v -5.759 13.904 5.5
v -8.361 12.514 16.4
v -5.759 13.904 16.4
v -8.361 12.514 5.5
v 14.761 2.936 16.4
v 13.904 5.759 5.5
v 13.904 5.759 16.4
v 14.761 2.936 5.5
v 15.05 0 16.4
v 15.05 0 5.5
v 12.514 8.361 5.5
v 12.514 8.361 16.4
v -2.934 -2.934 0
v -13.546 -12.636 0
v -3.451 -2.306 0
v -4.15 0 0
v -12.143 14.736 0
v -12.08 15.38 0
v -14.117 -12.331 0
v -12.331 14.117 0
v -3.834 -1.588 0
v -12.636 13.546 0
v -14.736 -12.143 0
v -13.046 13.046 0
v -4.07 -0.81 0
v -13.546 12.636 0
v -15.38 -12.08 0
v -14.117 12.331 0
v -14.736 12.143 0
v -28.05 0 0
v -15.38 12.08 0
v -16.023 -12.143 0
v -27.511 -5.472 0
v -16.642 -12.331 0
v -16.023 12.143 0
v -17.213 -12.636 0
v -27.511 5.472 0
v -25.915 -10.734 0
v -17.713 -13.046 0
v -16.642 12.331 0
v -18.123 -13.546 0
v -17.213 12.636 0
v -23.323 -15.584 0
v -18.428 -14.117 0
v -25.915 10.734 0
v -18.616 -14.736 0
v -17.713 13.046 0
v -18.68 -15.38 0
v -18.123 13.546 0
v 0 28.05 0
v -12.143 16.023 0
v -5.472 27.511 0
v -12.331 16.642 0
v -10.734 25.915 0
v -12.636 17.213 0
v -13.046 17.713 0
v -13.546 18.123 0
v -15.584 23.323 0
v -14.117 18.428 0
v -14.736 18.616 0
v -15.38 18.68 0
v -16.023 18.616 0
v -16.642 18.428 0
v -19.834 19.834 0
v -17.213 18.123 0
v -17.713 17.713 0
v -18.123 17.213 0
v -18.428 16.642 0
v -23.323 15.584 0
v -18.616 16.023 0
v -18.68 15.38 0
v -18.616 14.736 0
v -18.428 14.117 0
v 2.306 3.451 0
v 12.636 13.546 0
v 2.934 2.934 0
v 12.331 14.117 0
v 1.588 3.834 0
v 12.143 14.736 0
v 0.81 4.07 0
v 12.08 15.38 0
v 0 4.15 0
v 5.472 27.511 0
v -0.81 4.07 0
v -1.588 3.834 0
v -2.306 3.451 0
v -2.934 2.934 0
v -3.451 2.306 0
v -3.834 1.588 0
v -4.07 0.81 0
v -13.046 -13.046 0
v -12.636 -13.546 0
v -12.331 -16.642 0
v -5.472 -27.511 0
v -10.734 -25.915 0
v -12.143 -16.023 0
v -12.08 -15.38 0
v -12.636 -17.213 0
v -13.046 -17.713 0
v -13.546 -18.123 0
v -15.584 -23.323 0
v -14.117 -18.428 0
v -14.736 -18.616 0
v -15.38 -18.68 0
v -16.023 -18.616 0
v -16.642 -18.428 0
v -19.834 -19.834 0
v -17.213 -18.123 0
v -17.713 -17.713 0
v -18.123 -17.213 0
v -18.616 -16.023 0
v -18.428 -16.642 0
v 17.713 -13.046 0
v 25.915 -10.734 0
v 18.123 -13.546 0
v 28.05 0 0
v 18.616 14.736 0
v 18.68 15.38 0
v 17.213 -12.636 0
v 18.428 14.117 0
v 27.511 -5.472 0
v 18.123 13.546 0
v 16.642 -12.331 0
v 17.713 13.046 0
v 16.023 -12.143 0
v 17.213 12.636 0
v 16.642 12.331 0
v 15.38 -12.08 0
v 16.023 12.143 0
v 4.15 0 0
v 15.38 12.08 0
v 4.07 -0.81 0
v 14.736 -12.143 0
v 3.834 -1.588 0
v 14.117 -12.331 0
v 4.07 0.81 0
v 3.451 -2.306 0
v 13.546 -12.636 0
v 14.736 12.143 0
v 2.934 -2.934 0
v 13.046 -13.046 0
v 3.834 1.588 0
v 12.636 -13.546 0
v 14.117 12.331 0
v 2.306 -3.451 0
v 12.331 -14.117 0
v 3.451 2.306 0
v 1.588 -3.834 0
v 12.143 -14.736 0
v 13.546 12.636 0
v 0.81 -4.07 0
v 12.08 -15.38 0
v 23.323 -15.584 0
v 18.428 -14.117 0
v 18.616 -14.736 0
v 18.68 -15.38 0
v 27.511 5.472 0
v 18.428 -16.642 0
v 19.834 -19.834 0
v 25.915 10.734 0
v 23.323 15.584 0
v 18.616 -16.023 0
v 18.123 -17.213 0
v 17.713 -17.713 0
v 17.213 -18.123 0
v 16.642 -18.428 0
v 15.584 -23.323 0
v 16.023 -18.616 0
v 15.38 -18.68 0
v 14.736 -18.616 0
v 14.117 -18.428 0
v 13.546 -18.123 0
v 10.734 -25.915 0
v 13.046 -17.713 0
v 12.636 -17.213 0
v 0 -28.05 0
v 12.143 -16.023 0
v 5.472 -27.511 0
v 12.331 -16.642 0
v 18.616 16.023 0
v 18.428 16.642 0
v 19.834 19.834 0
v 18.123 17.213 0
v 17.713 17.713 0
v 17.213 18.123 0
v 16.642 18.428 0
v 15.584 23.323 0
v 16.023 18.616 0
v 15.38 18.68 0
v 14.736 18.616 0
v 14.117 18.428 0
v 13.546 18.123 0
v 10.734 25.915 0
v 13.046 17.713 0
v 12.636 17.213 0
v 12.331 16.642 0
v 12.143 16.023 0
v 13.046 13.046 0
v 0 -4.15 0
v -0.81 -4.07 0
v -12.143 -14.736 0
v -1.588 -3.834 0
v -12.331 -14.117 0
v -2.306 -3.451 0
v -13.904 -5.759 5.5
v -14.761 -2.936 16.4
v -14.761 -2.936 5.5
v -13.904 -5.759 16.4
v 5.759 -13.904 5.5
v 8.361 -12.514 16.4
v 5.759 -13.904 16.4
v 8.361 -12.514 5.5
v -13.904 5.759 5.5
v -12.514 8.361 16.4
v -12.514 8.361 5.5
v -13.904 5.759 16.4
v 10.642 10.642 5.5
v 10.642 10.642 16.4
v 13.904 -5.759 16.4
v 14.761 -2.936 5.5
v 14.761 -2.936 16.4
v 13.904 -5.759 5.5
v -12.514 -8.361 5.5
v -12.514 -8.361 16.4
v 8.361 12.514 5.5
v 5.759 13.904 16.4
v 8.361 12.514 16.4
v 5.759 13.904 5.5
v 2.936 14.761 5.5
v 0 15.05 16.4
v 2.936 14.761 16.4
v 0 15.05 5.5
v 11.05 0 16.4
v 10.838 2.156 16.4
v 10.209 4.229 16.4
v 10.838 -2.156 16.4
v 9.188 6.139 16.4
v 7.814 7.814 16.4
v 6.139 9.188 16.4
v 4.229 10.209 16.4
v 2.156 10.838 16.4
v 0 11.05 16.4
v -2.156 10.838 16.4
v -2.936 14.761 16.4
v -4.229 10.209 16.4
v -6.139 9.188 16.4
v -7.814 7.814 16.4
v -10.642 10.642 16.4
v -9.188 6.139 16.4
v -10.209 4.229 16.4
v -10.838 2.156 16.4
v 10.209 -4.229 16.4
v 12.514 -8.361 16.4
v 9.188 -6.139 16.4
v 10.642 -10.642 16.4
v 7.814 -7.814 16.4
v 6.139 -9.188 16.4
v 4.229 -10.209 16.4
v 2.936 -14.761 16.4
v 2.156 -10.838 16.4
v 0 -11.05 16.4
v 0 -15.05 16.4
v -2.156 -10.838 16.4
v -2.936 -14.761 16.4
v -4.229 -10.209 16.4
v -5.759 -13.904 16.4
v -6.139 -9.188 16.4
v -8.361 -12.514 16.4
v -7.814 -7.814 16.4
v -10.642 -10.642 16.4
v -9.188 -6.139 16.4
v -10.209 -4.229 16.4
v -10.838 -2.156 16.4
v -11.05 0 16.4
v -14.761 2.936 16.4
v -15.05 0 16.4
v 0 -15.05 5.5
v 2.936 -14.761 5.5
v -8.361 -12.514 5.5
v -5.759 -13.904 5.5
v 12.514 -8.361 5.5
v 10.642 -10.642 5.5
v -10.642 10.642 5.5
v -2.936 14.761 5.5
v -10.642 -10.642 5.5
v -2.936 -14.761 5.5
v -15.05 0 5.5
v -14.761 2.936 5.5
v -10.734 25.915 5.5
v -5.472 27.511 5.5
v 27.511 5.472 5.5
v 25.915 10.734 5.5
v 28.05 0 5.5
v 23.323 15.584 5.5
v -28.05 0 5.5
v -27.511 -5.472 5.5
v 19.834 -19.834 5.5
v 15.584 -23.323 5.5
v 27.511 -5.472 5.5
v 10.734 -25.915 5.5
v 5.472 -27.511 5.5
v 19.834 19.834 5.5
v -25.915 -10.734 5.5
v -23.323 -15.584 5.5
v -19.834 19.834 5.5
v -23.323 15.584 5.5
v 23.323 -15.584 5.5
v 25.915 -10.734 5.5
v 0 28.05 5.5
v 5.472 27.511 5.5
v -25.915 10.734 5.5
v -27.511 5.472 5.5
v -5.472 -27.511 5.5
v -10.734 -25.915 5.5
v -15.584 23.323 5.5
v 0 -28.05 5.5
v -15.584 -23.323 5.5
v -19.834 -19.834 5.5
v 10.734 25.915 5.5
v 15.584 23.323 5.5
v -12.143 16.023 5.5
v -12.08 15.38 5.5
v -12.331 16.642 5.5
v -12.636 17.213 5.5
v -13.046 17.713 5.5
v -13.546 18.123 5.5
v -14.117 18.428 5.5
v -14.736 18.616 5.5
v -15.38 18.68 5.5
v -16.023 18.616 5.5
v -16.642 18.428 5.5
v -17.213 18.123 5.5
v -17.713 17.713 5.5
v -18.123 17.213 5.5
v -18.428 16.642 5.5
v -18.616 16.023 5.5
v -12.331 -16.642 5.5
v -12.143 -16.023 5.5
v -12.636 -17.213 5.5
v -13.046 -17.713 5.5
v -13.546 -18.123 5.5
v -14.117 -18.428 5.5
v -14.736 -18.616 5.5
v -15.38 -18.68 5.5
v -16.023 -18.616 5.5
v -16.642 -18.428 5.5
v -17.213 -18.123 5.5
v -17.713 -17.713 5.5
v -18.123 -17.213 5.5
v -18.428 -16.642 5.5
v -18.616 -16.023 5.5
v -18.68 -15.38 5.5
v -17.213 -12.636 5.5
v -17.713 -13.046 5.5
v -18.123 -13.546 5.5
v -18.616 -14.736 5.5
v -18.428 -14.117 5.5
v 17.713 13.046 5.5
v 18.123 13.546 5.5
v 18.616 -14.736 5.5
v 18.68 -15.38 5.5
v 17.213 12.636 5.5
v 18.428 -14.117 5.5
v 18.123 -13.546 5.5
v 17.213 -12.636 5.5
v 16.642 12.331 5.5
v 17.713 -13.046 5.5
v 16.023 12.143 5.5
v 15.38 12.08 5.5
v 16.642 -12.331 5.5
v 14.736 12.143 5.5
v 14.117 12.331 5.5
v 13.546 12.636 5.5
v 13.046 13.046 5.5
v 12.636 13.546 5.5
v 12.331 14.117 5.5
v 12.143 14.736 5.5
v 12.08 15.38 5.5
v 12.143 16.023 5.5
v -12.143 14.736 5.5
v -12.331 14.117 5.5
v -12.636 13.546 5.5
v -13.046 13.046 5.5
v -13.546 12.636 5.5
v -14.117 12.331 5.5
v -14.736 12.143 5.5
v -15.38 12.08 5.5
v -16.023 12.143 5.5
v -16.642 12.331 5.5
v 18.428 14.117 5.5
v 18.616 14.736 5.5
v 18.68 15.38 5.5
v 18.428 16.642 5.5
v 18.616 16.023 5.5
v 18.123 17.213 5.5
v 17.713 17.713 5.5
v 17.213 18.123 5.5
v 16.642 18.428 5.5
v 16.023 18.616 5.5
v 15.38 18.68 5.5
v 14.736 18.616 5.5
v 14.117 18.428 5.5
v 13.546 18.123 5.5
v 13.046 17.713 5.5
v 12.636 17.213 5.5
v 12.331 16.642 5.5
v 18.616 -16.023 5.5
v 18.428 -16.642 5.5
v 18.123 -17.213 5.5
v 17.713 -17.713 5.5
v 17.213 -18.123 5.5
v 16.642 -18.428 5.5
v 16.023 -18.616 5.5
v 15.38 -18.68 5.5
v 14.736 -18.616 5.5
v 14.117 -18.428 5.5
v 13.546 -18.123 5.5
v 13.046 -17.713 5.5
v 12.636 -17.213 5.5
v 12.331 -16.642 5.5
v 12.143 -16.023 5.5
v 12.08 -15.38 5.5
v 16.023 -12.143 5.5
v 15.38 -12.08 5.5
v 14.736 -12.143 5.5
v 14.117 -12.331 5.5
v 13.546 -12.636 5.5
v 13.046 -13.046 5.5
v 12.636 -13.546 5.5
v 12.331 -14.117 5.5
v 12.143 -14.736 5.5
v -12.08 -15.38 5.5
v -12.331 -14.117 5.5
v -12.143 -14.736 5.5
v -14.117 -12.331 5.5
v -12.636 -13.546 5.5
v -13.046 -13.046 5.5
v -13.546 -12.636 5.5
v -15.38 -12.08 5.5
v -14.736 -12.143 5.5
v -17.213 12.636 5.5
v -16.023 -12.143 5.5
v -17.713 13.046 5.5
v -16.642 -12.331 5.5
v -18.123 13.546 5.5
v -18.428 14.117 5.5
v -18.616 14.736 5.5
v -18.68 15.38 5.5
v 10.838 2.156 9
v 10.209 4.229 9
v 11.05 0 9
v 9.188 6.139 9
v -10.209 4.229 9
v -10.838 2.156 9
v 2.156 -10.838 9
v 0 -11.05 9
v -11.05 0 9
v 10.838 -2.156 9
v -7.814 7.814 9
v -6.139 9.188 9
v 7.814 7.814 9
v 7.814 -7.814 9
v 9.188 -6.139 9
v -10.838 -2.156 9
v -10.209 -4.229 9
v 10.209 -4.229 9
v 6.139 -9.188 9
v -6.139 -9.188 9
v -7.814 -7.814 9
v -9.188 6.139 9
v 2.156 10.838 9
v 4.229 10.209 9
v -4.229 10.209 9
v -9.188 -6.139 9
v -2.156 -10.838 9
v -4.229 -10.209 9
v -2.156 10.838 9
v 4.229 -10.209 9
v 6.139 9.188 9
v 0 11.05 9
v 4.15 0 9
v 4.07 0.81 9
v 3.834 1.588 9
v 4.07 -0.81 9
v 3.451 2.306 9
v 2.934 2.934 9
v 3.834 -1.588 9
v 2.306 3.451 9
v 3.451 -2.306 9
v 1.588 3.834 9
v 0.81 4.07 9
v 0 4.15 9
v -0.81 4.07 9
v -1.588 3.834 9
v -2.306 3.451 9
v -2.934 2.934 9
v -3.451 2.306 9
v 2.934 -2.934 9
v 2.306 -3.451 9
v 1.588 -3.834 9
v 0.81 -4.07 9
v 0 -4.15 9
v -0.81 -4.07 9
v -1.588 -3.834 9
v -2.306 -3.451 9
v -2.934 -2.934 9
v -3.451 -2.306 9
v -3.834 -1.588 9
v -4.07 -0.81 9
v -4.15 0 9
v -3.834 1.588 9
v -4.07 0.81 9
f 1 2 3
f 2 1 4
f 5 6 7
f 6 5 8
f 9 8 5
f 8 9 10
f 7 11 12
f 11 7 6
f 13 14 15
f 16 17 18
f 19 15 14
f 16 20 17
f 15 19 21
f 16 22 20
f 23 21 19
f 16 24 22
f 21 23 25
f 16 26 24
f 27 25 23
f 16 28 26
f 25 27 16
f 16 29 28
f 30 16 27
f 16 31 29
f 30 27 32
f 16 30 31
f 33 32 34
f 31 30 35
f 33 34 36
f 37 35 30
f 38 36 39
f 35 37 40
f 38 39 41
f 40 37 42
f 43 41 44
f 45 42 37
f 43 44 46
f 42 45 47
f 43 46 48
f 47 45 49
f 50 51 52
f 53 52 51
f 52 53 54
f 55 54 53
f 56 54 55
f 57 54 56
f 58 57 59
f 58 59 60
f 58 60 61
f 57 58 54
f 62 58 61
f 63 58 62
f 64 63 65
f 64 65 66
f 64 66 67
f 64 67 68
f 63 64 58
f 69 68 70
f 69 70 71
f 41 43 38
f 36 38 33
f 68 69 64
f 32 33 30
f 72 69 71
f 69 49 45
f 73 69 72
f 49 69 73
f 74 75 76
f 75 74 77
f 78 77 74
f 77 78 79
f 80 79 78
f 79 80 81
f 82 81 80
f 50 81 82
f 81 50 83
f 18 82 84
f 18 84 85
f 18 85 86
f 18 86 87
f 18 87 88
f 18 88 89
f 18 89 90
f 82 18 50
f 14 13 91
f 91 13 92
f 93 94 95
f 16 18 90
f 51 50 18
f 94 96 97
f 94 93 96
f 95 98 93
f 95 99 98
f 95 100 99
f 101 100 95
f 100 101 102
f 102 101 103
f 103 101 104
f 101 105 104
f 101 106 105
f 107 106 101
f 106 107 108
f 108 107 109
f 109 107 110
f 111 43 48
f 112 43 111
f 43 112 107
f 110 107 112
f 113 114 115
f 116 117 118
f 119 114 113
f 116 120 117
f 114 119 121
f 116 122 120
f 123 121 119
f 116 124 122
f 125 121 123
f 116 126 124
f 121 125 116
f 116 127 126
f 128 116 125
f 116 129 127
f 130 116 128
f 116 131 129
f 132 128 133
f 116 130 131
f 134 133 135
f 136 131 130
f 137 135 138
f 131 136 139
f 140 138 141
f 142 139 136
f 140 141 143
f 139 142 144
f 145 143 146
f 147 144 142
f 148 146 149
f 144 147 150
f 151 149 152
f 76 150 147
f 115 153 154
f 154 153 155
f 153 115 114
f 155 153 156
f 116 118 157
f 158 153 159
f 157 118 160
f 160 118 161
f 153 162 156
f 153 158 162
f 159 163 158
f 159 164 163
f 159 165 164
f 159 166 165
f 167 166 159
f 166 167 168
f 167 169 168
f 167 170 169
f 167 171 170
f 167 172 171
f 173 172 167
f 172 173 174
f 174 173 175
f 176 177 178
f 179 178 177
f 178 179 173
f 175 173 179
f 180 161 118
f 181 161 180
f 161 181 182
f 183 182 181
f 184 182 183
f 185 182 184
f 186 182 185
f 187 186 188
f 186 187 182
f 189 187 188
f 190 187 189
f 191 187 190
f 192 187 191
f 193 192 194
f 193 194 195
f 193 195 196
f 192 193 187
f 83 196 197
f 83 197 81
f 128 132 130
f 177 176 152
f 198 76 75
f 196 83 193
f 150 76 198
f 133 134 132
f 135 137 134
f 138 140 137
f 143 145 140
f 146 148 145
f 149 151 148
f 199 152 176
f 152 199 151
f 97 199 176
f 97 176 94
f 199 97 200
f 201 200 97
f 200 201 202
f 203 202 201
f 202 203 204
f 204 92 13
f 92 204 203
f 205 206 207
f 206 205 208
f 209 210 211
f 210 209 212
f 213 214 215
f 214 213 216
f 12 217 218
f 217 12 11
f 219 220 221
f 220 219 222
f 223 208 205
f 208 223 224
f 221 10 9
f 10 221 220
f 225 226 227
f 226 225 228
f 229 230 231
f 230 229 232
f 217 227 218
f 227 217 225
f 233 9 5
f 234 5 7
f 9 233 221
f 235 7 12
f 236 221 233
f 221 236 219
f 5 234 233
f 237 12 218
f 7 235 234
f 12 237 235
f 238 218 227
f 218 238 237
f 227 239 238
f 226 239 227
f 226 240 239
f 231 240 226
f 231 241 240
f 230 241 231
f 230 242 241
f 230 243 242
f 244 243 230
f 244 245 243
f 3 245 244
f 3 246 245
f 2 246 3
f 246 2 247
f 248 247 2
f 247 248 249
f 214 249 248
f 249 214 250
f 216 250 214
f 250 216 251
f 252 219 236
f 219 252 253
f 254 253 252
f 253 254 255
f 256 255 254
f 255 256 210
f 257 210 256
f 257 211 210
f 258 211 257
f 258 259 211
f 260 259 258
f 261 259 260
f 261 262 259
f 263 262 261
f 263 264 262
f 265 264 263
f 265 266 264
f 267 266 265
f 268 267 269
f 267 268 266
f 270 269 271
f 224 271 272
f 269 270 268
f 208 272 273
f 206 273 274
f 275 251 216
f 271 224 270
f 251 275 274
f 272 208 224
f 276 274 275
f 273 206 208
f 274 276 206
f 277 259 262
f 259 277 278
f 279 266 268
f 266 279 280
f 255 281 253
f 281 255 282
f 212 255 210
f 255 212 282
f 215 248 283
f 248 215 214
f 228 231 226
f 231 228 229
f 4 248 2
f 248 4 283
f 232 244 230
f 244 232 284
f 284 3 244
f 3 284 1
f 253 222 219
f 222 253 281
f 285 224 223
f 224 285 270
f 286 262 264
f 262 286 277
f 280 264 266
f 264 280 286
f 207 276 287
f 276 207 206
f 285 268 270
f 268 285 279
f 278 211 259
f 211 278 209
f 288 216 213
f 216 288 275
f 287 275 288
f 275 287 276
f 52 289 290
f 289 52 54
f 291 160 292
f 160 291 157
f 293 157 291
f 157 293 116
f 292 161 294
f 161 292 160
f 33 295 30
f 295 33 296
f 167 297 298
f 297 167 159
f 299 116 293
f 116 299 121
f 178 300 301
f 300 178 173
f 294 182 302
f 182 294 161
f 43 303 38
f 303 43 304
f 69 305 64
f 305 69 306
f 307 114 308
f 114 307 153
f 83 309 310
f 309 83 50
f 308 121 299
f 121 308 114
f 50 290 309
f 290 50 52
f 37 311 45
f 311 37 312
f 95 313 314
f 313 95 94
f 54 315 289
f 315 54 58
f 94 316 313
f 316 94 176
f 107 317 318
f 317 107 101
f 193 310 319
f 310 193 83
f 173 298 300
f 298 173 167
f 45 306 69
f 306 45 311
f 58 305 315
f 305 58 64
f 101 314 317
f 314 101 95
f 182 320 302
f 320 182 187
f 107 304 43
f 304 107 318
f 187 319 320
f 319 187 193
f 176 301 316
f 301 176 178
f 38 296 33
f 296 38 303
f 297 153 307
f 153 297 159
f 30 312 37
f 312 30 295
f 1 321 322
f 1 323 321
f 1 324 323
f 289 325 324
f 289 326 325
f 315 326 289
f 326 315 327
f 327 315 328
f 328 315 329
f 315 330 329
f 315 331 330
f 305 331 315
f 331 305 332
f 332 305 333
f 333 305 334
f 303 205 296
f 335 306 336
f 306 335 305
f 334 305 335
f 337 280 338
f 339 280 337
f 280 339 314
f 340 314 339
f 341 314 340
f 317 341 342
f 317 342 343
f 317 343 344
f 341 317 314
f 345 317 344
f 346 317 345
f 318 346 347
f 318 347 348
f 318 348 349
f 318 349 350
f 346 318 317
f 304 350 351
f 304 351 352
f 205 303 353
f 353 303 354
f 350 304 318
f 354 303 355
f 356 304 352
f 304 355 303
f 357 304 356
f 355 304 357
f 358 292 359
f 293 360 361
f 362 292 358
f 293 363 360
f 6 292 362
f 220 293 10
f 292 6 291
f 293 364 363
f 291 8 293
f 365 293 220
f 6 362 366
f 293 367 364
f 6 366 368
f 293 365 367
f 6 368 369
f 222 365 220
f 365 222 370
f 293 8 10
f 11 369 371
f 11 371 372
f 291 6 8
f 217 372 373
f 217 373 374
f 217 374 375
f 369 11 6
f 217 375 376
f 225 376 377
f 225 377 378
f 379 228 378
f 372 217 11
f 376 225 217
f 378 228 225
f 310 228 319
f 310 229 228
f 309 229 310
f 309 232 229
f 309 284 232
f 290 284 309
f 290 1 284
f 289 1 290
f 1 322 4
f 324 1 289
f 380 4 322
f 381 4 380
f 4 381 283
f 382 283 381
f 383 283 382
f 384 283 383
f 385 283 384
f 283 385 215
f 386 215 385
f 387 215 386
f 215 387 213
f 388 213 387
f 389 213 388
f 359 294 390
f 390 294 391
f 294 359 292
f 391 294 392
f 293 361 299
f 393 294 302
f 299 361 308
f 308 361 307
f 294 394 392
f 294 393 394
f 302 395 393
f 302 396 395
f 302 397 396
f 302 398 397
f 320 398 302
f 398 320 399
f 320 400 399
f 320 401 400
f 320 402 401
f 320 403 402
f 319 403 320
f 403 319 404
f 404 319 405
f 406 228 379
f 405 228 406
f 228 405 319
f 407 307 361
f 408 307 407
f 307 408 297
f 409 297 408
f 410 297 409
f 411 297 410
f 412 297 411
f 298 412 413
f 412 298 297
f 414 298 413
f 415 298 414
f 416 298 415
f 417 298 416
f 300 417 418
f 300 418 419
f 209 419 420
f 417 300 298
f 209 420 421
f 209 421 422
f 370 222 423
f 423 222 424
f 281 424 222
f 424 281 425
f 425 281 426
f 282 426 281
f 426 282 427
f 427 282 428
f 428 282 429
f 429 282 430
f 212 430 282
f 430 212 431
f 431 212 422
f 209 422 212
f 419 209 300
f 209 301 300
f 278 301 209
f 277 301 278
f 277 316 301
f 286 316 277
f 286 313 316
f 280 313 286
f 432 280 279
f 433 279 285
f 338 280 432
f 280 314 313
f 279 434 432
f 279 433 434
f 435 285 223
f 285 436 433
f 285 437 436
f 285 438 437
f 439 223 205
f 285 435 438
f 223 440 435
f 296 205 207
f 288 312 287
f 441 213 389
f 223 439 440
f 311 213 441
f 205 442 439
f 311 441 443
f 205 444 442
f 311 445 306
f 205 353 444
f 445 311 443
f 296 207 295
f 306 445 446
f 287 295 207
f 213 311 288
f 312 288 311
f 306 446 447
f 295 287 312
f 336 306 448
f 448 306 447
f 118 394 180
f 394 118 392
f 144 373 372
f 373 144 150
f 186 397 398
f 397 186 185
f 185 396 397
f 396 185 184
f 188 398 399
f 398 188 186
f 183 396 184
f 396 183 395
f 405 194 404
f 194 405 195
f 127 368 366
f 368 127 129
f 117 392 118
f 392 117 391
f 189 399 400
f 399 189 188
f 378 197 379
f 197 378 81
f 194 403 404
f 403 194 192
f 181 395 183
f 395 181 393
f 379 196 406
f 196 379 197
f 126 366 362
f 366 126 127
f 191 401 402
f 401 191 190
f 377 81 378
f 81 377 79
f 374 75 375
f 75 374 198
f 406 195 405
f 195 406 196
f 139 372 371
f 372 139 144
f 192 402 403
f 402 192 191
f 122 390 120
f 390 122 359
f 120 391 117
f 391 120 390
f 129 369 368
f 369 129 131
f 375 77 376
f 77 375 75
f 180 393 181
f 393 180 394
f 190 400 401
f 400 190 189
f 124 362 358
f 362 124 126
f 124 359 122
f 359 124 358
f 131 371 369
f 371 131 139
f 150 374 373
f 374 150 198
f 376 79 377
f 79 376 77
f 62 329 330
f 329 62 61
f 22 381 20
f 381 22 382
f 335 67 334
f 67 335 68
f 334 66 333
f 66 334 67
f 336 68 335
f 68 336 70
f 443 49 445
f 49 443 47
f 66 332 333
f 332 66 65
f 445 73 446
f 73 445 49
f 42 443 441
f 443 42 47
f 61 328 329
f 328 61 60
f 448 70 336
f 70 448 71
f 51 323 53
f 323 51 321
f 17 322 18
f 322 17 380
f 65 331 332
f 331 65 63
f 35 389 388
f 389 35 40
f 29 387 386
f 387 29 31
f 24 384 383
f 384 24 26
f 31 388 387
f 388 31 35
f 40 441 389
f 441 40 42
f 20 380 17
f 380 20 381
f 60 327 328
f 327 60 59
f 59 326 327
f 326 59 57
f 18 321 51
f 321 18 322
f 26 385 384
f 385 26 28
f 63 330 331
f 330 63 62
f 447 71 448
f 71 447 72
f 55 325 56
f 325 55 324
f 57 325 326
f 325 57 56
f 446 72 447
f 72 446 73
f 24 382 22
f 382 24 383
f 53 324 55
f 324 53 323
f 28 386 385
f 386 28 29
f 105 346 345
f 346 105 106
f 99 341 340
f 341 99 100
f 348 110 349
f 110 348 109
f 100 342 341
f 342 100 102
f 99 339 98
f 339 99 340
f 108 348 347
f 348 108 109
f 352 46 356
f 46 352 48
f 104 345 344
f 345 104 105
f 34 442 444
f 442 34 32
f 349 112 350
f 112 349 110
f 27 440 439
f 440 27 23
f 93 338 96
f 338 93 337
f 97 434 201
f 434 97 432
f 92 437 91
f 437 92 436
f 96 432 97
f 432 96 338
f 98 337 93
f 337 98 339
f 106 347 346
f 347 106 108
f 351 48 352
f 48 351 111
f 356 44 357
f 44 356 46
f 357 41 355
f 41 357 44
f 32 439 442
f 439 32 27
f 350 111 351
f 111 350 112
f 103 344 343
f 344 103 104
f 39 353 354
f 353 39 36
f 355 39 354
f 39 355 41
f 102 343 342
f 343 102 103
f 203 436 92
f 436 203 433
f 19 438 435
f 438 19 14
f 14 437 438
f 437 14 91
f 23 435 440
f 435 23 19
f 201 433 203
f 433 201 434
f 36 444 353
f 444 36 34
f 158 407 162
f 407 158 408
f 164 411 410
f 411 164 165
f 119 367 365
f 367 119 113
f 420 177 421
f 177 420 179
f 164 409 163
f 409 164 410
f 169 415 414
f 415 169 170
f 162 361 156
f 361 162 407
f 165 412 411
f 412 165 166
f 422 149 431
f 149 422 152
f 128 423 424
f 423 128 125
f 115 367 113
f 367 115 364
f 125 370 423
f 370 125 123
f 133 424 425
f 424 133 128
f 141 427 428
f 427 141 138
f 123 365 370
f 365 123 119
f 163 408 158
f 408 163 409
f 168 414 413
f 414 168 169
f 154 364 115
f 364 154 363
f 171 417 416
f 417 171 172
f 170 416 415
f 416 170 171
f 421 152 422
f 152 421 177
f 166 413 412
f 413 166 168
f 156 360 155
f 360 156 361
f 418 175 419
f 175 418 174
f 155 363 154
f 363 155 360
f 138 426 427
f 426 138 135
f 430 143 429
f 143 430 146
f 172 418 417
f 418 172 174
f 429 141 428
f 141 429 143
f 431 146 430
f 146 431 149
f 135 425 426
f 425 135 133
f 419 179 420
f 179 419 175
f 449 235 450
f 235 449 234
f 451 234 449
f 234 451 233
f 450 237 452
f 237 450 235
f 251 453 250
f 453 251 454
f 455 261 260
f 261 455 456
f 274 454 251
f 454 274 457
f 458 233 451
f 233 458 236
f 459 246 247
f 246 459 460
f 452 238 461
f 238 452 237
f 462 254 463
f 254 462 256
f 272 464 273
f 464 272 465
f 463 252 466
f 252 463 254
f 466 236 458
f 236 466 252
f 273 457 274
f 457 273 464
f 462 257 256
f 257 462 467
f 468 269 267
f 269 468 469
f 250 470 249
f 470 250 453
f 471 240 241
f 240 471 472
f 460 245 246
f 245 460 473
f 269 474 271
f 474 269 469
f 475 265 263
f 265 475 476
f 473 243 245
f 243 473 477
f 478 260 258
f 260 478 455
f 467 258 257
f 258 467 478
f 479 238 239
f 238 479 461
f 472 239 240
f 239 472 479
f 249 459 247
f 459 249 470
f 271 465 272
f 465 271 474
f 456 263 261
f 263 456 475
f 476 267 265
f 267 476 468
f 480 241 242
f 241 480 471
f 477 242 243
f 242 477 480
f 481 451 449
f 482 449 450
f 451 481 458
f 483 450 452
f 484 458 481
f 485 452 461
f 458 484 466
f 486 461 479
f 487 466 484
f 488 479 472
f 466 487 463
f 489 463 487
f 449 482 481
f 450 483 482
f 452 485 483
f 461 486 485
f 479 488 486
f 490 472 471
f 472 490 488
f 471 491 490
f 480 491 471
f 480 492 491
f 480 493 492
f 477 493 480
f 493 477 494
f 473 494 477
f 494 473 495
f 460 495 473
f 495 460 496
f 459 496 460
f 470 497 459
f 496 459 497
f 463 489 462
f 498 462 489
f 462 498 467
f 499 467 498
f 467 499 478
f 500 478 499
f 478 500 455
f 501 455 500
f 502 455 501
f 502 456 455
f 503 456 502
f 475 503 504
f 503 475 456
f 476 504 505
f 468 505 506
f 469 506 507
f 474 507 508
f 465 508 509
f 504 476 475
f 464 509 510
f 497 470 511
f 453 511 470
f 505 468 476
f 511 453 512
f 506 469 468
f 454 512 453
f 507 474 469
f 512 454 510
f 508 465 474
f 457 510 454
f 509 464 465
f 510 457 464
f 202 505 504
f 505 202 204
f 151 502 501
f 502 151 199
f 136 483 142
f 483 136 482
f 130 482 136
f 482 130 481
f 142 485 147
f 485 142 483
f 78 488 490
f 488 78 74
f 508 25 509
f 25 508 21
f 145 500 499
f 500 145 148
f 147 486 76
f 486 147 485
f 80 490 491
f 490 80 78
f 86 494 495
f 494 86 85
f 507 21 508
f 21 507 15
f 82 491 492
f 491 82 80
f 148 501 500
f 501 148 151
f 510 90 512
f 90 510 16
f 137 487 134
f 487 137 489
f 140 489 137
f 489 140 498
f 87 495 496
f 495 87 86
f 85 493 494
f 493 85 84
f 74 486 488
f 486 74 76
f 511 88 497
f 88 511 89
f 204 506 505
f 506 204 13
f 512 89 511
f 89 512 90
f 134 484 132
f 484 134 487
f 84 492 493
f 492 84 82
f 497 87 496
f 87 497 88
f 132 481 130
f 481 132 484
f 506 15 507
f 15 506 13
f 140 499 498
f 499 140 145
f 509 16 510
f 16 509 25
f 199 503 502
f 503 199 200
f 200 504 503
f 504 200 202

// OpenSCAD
$fn = 32;

// ----------------------------------------------------------------------
// Bearing housing: seat for 608 (22 x 7 mm), 30.1 mm body
// ----------------------------------------------------------------------

// --- parameters (mm) ---
case_d = 30.1;            // housing outside diameter
case_h = 16.4;            // overall housing height
rim_t = 4;                // wall thickness
bearing_seat = 22.1;      // 608 seat, 0.1 mm clearance
seat_h = 7.4;             // pocket depth
shoulder = 5;             // shoulder under the bearing
pass_d = 8.3;             // shaft passage
ear_d = 56.1;             // mounting flange diameter
flange_t = 4;             // flange thickness
bolt_d = 6.6;             // flange bolt clearance
bolt_r = 21.75;           // flange bolt circle radius

module body() {
  cylinder(h = case_h, d = case_d);
}

module flange() {
  /* flange sunk 1.5 mm into the body */
  cylinder(h = flange_t + 1.5, d = ear_d);
}

difference() {
  union() {
    body();
    flange();
  }
  translate([0, 0, case_h - seat_h]) cylinder(h = seat_h + 1, d = bearing_seat);
  translate([0, 0, -1]) cylinder(h = case_h - seat_h + 1, d = pass_d);
  for (i = [0 : 3]) rotate([0, 0, 45 + i * 90]) translate([bolt_r, 0, -1])
    cylinder(h = flange_t + 3, d = bolt_d);
}
